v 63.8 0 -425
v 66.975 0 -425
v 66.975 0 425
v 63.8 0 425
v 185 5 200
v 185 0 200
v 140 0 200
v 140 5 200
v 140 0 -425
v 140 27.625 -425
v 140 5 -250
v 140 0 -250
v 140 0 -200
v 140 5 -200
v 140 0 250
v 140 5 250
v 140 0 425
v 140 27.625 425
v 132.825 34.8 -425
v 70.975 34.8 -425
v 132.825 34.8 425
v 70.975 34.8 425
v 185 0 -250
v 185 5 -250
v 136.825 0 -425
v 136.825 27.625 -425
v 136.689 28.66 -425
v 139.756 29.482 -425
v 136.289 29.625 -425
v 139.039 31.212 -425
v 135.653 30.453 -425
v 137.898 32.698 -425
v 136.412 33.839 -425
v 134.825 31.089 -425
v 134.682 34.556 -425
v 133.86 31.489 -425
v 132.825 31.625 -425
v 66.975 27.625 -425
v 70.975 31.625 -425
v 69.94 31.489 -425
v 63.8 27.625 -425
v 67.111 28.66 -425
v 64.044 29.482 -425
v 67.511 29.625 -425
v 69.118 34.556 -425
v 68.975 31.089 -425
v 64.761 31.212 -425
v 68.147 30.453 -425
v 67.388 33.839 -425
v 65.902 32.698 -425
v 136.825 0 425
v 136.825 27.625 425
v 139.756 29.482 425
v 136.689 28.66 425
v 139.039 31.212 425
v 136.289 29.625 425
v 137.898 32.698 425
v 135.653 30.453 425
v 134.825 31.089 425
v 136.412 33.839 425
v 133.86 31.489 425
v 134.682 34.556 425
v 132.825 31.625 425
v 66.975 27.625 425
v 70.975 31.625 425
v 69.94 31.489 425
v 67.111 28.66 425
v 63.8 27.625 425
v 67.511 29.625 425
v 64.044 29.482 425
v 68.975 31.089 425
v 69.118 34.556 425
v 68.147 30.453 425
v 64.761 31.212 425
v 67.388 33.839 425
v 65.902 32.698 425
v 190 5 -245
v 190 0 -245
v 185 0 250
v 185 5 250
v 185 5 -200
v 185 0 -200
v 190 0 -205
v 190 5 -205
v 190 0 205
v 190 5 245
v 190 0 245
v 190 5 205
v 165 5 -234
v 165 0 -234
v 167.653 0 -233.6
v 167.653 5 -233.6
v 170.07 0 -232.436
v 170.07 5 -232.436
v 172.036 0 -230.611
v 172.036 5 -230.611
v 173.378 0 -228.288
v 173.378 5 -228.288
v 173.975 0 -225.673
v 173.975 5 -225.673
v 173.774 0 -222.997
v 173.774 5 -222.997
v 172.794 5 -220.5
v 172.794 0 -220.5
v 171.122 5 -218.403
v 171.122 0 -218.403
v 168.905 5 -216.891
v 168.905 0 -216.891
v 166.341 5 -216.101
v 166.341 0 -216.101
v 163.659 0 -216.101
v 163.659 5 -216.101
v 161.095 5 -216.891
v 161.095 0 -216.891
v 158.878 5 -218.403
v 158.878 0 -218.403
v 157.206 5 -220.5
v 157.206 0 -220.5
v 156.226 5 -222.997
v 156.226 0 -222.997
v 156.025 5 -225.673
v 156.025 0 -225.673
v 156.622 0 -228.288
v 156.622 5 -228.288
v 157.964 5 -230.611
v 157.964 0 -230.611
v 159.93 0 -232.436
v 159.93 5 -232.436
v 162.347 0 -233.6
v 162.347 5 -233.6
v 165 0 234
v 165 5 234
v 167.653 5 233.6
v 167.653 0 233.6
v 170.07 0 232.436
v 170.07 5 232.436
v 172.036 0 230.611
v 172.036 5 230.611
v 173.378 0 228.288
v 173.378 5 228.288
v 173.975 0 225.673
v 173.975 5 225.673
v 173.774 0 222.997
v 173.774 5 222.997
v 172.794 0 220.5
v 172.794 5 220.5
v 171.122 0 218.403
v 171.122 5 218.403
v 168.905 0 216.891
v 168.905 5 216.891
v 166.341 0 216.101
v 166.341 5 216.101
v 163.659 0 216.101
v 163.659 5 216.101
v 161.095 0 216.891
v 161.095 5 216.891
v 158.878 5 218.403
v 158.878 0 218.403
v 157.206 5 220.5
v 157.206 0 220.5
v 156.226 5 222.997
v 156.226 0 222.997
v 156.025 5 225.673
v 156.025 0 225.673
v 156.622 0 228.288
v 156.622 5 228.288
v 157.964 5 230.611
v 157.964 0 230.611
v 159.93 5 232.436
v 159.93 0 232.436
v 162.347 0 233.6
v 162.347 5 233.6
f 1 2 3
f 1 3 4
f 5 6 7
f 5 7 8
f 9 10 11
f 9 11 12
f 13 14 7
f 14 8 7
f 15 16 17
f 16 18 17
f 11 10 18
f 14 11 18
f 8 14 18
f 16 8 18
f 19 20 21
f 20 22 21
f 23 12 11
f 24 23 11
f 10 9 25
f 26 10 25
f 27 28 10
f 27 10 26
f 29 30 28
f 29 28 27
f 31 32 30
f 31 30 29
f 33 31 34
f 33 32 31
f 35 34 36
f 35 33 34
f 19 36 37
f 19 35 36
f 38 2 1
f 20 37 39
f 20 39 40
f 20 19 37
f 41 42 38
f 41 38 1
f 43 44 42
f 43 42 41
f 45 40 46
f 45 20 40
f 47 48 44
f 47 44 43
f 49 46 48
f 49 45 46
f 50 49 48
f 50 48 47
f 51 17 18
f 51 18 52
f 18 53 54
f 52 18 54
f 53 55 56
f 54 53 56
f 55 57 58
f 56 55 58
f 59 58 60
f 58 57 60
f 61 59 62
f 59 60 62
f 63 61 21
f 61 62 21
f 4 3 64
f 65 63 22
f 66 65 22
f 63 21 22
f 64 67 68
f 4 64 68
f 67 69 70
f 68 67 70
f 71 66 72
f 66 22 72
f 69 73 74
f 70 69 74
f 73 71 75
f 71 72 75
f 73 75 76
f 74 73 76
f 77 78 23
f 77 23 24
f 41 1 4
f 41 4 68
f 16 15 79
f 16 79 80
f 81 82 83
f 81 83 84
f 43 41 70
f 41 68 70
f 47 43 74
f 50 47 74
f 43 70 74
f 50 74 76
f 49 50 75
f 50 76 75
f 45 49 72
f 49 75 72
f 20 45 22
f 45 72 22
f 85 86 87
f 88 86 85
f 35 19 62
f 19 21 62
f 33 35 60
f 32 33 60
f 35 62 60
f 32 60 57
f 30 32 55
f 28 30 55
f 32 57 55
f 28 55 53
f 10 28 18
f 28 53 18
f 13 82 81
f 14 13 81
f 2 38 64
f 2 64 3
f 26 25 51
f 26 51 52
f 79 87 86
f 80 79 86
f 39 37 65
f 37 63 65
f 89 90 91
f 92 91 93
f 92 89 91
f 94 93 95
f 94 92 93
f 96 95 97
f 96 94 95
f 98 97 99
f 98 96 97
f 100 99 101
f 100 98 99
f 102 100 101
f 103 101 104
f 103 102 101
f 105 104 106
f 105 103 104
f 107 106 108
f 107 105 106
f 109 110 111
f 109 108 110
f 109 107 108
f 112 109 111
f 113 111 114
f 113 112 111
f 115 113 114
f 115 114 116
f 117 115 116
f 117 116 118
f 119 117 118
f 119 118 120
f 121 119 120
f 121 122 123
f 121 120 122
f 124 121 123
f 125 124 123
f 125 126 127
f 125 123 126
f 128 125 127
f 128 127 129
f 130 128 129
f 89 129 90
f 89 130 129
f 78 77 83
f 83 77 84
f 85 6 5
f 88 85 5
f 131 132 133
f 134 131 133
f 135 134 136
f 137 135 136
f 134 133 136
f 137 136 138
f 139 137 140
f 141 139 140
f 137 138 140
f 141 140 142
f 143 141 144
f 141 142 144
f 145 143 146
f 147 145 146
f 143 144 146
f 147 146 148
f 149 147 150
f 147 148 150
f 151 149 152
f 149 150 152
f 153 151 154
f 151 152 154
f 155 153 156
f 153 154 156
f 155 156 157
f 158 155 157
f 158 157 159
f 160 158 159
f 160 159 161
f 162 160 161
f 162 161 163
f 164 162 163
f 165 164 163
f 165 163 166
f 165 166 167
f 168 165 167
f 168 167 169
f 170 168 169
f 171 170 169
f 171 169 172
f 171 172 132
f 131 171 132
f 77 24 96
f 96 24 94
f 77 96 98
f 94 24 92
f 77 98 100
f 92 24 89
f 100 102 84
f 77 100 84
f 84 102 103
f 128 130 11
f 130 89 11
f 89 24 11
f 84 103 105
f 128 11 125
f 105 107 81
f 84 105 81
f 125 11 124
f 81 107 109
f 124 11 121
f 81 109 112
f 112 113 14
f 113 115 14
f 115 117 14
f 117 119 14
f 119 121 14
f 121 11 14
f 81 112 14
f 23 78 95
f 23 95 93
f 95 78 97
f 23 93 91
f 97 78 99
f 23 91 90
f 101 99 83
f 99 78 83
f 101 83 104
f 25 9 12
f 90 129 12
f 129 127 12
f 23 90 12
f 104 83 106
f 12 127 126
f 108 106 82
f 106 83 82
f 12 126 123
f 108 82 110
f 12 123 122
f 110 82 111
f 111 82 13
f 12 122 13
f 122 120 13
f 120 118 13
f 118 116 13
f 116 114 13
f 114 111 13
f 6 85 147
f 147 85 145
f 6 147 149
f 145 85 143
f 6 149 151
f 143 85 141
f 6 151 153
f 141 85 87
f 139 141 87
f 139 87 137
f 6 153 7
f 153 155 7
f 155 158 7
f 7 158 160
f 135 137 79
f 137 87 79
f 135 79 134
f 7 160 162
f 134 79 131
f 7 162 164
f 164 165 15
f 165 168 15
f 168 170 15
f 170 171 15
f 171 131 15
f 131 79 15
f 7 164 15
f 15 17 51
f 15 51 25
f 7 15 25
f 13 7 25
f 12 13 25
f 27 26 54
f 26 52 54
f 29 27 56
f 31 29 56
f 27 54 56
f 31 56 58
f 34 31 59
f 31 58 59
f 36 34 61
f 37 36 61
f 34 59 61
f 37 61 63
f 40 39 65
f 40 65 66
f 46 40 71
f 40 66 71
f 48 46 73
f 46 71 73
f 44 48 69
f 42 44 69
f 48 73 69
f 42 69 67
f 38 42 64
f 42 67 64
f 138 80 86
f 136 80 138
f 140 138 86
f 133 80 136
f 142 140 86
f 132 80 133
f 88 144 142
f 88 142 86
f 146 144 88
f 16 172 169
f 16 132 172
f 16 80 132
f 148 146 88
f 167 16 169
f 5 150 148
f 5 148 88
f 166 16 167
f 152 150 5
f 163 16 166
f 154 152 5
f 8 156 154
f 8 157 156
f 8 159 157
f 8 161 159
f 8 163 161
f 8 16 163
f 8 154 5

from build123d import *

# Parameters (mm, degrees)
BASE_FLANGE3_DEPTH       = 425
SKETCH21_W               = 50
SKETCH21_H               = 5
BOSS_EXTRUDE2_DEPTH      = 50
CHAMFER1_SIZE            = 5
SKETCH26_R               = 9
CUT_EXTRUDE1_DEPTH       = 50
CHAMFER1_OF_MIRROR1_SIZE = 5


# Sheet-metal steps are written as plain solids
with BuildPart() as part:
    # Sketch1 → Base-Flange3 (new, symmetric)
    with BuildSketch(Plane.XY):
        with BuildLine():
            Line((63.8, 0), (63.8, 27.625))
            ThreePointArc((63.8, 27.625), (65.901508845, 32.698491155), (70.975, 34.8))
            Line((70.975, 34.8), (132.825, 34.8))
            ThreePointArc((132.825, 34.8), (137.898491155, 32.698491155), (140, 27.625))
            Line((140, 27.625), (140, 0))
            Line((140, 0), (136.825, 0))
            Line((136.825, 0), (136.825, 27.625))
            ThreePointArc((136.825, 27.625), (135.653427125, 30.453427125), (132.825, 31.625))
            Line((132.825, 31.625), (70.975, 31.625))
            ThreePointArc((70.975, 31.625), (68.146572875, 30.453427125), (66.975, 27.625))
            Line((66.975, 27.625), (66.975, 0))
            Line((66.975, 0), (63.8, 0))
        make_face()
    extrude(amount=BASE_FLANGE3_DEPTH, both=True)

    # Sketch21 → Boss-Extrude2 (add)
    with BuildSketch(Plane(origin=(140, 0, 0), x_dir=(0, 0, -1), z_dir=(1, 0, 0))):
        with Locations((-225, 2.5)):
            Rectangle(SKETCH21_W, SKETCH21_H)
    boss_extrude2 = extrude(amount=BOSS_EXTRUDE2_DEPTH)

    # Chamfer1
    chamfer1_edges = [part.edges().sort_by_distance(p)[0] for p in [
        (190, 2.5, 250),
        (190, 2.5, 200),
    ]]
    chamfer(chamfer1_edges, length=CHAMFER1_SIZE)

    # Sketch26 → Cut-Extrude1 (cut)
    with BuildSketch(Plane(origin=(0, 5, 0), x_dir=(1, 0, 0), z_dir=(0, 1, 0))):
        with Locations(Location((165, -225, 0), (0, 0, 270))):
            Circle(SKETCH26_R)
    cut_extrude1 = extrude(amount=-CUT_EXTRUDE1_DEPTH, mode=Mode.SUBTRACT)

    # Mirror1: Boss-Extrude2, Cut-Extrude1 across plane
    add(boss_extrude2.mirror(Plane.XY))
    add(cut_extrude1.mirror(Plane.XY), mode=Mode.SUBTRACT)

    # Chamfer1 of Mirror1
    chamfer1_of_mirror1_edges = [part.edges().sort_by_distance(p)[0] for p in [
        (190, 2.5, -250),
        (190, 2.5, -200),
    ]]
    chamfer(chamfer1_of_mirror1_edges, length=CHAMFER1_OF_MIRROR1_SIZE)


solid = part.part
